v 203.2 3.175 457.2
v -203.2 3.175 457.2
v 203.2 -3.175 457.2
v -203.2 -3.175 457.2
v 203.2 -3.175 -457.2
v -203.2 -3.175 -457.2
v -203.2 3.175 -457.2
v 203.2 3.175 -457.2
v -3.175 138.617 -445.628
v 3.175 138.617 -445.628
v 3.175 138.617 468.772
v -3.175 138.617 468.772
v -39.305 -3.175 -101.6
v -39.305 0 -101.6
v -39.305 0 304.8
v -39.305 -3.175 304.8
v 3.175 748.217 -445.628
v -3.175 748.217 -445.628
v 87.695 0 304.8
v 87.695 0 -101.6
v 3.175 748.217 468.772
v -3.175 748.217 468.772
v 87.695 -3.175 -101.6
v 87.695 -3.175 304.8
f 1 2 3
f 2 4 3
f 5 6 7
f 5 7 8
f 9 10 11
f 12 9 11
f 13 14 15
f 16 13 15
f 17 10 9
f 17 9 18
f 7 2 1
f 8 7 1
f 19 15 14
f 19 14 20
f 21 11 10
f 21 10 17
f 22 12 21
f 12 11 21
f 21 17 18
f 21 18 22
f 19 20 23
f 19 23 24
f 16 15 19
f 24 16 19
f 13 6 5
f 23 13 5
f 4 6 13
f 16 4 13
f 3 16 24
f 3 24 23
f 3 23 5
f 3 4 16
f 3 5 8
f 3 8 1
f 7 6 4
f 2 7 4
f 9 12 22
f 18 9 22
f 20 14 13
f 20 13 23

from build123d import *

# Parameters (mm, degrees)
F0_W     = 406.4
F0_H     = 914.4
F2_DEPTH = 3.175
F3_W     = 609.6
F3_H     = 914.4
F4_DEPTH = 3.175
F1_W     = 127
F1_H     = 406.4
F5_DEPTH = 3.176


with BuildPart() as f2:
    # F0 (on Front) → F2 (new body, symmetric)
    with BuildSketch(Plane.XZ):
        Rectangle(F0_W, F0_H)
    extrude(amount=F2_DEPTH, both=True)

    # F1 (on face) → F5 (cut, through all)
    with BuildSketch(Plane.XZ):
        with Locations((24.194895, 101.6)):
            Rectangle(F1_W, F1_H)
    extrude(amount=F5_DEPTH, mode=Mode.SUBTRACT)


with BuildPart() as f4:
    # F3 (on Right) → F4 (new body, symmetric)
    with BuildSketch(Plane.YZ):
        with Locations((443.417262, 11.572191)):
            Rectangle(F3_W, F3_H)
    extrude(amount=F4_DEPTH, both=True)


solid = Compound([f2.part, f4.part])
